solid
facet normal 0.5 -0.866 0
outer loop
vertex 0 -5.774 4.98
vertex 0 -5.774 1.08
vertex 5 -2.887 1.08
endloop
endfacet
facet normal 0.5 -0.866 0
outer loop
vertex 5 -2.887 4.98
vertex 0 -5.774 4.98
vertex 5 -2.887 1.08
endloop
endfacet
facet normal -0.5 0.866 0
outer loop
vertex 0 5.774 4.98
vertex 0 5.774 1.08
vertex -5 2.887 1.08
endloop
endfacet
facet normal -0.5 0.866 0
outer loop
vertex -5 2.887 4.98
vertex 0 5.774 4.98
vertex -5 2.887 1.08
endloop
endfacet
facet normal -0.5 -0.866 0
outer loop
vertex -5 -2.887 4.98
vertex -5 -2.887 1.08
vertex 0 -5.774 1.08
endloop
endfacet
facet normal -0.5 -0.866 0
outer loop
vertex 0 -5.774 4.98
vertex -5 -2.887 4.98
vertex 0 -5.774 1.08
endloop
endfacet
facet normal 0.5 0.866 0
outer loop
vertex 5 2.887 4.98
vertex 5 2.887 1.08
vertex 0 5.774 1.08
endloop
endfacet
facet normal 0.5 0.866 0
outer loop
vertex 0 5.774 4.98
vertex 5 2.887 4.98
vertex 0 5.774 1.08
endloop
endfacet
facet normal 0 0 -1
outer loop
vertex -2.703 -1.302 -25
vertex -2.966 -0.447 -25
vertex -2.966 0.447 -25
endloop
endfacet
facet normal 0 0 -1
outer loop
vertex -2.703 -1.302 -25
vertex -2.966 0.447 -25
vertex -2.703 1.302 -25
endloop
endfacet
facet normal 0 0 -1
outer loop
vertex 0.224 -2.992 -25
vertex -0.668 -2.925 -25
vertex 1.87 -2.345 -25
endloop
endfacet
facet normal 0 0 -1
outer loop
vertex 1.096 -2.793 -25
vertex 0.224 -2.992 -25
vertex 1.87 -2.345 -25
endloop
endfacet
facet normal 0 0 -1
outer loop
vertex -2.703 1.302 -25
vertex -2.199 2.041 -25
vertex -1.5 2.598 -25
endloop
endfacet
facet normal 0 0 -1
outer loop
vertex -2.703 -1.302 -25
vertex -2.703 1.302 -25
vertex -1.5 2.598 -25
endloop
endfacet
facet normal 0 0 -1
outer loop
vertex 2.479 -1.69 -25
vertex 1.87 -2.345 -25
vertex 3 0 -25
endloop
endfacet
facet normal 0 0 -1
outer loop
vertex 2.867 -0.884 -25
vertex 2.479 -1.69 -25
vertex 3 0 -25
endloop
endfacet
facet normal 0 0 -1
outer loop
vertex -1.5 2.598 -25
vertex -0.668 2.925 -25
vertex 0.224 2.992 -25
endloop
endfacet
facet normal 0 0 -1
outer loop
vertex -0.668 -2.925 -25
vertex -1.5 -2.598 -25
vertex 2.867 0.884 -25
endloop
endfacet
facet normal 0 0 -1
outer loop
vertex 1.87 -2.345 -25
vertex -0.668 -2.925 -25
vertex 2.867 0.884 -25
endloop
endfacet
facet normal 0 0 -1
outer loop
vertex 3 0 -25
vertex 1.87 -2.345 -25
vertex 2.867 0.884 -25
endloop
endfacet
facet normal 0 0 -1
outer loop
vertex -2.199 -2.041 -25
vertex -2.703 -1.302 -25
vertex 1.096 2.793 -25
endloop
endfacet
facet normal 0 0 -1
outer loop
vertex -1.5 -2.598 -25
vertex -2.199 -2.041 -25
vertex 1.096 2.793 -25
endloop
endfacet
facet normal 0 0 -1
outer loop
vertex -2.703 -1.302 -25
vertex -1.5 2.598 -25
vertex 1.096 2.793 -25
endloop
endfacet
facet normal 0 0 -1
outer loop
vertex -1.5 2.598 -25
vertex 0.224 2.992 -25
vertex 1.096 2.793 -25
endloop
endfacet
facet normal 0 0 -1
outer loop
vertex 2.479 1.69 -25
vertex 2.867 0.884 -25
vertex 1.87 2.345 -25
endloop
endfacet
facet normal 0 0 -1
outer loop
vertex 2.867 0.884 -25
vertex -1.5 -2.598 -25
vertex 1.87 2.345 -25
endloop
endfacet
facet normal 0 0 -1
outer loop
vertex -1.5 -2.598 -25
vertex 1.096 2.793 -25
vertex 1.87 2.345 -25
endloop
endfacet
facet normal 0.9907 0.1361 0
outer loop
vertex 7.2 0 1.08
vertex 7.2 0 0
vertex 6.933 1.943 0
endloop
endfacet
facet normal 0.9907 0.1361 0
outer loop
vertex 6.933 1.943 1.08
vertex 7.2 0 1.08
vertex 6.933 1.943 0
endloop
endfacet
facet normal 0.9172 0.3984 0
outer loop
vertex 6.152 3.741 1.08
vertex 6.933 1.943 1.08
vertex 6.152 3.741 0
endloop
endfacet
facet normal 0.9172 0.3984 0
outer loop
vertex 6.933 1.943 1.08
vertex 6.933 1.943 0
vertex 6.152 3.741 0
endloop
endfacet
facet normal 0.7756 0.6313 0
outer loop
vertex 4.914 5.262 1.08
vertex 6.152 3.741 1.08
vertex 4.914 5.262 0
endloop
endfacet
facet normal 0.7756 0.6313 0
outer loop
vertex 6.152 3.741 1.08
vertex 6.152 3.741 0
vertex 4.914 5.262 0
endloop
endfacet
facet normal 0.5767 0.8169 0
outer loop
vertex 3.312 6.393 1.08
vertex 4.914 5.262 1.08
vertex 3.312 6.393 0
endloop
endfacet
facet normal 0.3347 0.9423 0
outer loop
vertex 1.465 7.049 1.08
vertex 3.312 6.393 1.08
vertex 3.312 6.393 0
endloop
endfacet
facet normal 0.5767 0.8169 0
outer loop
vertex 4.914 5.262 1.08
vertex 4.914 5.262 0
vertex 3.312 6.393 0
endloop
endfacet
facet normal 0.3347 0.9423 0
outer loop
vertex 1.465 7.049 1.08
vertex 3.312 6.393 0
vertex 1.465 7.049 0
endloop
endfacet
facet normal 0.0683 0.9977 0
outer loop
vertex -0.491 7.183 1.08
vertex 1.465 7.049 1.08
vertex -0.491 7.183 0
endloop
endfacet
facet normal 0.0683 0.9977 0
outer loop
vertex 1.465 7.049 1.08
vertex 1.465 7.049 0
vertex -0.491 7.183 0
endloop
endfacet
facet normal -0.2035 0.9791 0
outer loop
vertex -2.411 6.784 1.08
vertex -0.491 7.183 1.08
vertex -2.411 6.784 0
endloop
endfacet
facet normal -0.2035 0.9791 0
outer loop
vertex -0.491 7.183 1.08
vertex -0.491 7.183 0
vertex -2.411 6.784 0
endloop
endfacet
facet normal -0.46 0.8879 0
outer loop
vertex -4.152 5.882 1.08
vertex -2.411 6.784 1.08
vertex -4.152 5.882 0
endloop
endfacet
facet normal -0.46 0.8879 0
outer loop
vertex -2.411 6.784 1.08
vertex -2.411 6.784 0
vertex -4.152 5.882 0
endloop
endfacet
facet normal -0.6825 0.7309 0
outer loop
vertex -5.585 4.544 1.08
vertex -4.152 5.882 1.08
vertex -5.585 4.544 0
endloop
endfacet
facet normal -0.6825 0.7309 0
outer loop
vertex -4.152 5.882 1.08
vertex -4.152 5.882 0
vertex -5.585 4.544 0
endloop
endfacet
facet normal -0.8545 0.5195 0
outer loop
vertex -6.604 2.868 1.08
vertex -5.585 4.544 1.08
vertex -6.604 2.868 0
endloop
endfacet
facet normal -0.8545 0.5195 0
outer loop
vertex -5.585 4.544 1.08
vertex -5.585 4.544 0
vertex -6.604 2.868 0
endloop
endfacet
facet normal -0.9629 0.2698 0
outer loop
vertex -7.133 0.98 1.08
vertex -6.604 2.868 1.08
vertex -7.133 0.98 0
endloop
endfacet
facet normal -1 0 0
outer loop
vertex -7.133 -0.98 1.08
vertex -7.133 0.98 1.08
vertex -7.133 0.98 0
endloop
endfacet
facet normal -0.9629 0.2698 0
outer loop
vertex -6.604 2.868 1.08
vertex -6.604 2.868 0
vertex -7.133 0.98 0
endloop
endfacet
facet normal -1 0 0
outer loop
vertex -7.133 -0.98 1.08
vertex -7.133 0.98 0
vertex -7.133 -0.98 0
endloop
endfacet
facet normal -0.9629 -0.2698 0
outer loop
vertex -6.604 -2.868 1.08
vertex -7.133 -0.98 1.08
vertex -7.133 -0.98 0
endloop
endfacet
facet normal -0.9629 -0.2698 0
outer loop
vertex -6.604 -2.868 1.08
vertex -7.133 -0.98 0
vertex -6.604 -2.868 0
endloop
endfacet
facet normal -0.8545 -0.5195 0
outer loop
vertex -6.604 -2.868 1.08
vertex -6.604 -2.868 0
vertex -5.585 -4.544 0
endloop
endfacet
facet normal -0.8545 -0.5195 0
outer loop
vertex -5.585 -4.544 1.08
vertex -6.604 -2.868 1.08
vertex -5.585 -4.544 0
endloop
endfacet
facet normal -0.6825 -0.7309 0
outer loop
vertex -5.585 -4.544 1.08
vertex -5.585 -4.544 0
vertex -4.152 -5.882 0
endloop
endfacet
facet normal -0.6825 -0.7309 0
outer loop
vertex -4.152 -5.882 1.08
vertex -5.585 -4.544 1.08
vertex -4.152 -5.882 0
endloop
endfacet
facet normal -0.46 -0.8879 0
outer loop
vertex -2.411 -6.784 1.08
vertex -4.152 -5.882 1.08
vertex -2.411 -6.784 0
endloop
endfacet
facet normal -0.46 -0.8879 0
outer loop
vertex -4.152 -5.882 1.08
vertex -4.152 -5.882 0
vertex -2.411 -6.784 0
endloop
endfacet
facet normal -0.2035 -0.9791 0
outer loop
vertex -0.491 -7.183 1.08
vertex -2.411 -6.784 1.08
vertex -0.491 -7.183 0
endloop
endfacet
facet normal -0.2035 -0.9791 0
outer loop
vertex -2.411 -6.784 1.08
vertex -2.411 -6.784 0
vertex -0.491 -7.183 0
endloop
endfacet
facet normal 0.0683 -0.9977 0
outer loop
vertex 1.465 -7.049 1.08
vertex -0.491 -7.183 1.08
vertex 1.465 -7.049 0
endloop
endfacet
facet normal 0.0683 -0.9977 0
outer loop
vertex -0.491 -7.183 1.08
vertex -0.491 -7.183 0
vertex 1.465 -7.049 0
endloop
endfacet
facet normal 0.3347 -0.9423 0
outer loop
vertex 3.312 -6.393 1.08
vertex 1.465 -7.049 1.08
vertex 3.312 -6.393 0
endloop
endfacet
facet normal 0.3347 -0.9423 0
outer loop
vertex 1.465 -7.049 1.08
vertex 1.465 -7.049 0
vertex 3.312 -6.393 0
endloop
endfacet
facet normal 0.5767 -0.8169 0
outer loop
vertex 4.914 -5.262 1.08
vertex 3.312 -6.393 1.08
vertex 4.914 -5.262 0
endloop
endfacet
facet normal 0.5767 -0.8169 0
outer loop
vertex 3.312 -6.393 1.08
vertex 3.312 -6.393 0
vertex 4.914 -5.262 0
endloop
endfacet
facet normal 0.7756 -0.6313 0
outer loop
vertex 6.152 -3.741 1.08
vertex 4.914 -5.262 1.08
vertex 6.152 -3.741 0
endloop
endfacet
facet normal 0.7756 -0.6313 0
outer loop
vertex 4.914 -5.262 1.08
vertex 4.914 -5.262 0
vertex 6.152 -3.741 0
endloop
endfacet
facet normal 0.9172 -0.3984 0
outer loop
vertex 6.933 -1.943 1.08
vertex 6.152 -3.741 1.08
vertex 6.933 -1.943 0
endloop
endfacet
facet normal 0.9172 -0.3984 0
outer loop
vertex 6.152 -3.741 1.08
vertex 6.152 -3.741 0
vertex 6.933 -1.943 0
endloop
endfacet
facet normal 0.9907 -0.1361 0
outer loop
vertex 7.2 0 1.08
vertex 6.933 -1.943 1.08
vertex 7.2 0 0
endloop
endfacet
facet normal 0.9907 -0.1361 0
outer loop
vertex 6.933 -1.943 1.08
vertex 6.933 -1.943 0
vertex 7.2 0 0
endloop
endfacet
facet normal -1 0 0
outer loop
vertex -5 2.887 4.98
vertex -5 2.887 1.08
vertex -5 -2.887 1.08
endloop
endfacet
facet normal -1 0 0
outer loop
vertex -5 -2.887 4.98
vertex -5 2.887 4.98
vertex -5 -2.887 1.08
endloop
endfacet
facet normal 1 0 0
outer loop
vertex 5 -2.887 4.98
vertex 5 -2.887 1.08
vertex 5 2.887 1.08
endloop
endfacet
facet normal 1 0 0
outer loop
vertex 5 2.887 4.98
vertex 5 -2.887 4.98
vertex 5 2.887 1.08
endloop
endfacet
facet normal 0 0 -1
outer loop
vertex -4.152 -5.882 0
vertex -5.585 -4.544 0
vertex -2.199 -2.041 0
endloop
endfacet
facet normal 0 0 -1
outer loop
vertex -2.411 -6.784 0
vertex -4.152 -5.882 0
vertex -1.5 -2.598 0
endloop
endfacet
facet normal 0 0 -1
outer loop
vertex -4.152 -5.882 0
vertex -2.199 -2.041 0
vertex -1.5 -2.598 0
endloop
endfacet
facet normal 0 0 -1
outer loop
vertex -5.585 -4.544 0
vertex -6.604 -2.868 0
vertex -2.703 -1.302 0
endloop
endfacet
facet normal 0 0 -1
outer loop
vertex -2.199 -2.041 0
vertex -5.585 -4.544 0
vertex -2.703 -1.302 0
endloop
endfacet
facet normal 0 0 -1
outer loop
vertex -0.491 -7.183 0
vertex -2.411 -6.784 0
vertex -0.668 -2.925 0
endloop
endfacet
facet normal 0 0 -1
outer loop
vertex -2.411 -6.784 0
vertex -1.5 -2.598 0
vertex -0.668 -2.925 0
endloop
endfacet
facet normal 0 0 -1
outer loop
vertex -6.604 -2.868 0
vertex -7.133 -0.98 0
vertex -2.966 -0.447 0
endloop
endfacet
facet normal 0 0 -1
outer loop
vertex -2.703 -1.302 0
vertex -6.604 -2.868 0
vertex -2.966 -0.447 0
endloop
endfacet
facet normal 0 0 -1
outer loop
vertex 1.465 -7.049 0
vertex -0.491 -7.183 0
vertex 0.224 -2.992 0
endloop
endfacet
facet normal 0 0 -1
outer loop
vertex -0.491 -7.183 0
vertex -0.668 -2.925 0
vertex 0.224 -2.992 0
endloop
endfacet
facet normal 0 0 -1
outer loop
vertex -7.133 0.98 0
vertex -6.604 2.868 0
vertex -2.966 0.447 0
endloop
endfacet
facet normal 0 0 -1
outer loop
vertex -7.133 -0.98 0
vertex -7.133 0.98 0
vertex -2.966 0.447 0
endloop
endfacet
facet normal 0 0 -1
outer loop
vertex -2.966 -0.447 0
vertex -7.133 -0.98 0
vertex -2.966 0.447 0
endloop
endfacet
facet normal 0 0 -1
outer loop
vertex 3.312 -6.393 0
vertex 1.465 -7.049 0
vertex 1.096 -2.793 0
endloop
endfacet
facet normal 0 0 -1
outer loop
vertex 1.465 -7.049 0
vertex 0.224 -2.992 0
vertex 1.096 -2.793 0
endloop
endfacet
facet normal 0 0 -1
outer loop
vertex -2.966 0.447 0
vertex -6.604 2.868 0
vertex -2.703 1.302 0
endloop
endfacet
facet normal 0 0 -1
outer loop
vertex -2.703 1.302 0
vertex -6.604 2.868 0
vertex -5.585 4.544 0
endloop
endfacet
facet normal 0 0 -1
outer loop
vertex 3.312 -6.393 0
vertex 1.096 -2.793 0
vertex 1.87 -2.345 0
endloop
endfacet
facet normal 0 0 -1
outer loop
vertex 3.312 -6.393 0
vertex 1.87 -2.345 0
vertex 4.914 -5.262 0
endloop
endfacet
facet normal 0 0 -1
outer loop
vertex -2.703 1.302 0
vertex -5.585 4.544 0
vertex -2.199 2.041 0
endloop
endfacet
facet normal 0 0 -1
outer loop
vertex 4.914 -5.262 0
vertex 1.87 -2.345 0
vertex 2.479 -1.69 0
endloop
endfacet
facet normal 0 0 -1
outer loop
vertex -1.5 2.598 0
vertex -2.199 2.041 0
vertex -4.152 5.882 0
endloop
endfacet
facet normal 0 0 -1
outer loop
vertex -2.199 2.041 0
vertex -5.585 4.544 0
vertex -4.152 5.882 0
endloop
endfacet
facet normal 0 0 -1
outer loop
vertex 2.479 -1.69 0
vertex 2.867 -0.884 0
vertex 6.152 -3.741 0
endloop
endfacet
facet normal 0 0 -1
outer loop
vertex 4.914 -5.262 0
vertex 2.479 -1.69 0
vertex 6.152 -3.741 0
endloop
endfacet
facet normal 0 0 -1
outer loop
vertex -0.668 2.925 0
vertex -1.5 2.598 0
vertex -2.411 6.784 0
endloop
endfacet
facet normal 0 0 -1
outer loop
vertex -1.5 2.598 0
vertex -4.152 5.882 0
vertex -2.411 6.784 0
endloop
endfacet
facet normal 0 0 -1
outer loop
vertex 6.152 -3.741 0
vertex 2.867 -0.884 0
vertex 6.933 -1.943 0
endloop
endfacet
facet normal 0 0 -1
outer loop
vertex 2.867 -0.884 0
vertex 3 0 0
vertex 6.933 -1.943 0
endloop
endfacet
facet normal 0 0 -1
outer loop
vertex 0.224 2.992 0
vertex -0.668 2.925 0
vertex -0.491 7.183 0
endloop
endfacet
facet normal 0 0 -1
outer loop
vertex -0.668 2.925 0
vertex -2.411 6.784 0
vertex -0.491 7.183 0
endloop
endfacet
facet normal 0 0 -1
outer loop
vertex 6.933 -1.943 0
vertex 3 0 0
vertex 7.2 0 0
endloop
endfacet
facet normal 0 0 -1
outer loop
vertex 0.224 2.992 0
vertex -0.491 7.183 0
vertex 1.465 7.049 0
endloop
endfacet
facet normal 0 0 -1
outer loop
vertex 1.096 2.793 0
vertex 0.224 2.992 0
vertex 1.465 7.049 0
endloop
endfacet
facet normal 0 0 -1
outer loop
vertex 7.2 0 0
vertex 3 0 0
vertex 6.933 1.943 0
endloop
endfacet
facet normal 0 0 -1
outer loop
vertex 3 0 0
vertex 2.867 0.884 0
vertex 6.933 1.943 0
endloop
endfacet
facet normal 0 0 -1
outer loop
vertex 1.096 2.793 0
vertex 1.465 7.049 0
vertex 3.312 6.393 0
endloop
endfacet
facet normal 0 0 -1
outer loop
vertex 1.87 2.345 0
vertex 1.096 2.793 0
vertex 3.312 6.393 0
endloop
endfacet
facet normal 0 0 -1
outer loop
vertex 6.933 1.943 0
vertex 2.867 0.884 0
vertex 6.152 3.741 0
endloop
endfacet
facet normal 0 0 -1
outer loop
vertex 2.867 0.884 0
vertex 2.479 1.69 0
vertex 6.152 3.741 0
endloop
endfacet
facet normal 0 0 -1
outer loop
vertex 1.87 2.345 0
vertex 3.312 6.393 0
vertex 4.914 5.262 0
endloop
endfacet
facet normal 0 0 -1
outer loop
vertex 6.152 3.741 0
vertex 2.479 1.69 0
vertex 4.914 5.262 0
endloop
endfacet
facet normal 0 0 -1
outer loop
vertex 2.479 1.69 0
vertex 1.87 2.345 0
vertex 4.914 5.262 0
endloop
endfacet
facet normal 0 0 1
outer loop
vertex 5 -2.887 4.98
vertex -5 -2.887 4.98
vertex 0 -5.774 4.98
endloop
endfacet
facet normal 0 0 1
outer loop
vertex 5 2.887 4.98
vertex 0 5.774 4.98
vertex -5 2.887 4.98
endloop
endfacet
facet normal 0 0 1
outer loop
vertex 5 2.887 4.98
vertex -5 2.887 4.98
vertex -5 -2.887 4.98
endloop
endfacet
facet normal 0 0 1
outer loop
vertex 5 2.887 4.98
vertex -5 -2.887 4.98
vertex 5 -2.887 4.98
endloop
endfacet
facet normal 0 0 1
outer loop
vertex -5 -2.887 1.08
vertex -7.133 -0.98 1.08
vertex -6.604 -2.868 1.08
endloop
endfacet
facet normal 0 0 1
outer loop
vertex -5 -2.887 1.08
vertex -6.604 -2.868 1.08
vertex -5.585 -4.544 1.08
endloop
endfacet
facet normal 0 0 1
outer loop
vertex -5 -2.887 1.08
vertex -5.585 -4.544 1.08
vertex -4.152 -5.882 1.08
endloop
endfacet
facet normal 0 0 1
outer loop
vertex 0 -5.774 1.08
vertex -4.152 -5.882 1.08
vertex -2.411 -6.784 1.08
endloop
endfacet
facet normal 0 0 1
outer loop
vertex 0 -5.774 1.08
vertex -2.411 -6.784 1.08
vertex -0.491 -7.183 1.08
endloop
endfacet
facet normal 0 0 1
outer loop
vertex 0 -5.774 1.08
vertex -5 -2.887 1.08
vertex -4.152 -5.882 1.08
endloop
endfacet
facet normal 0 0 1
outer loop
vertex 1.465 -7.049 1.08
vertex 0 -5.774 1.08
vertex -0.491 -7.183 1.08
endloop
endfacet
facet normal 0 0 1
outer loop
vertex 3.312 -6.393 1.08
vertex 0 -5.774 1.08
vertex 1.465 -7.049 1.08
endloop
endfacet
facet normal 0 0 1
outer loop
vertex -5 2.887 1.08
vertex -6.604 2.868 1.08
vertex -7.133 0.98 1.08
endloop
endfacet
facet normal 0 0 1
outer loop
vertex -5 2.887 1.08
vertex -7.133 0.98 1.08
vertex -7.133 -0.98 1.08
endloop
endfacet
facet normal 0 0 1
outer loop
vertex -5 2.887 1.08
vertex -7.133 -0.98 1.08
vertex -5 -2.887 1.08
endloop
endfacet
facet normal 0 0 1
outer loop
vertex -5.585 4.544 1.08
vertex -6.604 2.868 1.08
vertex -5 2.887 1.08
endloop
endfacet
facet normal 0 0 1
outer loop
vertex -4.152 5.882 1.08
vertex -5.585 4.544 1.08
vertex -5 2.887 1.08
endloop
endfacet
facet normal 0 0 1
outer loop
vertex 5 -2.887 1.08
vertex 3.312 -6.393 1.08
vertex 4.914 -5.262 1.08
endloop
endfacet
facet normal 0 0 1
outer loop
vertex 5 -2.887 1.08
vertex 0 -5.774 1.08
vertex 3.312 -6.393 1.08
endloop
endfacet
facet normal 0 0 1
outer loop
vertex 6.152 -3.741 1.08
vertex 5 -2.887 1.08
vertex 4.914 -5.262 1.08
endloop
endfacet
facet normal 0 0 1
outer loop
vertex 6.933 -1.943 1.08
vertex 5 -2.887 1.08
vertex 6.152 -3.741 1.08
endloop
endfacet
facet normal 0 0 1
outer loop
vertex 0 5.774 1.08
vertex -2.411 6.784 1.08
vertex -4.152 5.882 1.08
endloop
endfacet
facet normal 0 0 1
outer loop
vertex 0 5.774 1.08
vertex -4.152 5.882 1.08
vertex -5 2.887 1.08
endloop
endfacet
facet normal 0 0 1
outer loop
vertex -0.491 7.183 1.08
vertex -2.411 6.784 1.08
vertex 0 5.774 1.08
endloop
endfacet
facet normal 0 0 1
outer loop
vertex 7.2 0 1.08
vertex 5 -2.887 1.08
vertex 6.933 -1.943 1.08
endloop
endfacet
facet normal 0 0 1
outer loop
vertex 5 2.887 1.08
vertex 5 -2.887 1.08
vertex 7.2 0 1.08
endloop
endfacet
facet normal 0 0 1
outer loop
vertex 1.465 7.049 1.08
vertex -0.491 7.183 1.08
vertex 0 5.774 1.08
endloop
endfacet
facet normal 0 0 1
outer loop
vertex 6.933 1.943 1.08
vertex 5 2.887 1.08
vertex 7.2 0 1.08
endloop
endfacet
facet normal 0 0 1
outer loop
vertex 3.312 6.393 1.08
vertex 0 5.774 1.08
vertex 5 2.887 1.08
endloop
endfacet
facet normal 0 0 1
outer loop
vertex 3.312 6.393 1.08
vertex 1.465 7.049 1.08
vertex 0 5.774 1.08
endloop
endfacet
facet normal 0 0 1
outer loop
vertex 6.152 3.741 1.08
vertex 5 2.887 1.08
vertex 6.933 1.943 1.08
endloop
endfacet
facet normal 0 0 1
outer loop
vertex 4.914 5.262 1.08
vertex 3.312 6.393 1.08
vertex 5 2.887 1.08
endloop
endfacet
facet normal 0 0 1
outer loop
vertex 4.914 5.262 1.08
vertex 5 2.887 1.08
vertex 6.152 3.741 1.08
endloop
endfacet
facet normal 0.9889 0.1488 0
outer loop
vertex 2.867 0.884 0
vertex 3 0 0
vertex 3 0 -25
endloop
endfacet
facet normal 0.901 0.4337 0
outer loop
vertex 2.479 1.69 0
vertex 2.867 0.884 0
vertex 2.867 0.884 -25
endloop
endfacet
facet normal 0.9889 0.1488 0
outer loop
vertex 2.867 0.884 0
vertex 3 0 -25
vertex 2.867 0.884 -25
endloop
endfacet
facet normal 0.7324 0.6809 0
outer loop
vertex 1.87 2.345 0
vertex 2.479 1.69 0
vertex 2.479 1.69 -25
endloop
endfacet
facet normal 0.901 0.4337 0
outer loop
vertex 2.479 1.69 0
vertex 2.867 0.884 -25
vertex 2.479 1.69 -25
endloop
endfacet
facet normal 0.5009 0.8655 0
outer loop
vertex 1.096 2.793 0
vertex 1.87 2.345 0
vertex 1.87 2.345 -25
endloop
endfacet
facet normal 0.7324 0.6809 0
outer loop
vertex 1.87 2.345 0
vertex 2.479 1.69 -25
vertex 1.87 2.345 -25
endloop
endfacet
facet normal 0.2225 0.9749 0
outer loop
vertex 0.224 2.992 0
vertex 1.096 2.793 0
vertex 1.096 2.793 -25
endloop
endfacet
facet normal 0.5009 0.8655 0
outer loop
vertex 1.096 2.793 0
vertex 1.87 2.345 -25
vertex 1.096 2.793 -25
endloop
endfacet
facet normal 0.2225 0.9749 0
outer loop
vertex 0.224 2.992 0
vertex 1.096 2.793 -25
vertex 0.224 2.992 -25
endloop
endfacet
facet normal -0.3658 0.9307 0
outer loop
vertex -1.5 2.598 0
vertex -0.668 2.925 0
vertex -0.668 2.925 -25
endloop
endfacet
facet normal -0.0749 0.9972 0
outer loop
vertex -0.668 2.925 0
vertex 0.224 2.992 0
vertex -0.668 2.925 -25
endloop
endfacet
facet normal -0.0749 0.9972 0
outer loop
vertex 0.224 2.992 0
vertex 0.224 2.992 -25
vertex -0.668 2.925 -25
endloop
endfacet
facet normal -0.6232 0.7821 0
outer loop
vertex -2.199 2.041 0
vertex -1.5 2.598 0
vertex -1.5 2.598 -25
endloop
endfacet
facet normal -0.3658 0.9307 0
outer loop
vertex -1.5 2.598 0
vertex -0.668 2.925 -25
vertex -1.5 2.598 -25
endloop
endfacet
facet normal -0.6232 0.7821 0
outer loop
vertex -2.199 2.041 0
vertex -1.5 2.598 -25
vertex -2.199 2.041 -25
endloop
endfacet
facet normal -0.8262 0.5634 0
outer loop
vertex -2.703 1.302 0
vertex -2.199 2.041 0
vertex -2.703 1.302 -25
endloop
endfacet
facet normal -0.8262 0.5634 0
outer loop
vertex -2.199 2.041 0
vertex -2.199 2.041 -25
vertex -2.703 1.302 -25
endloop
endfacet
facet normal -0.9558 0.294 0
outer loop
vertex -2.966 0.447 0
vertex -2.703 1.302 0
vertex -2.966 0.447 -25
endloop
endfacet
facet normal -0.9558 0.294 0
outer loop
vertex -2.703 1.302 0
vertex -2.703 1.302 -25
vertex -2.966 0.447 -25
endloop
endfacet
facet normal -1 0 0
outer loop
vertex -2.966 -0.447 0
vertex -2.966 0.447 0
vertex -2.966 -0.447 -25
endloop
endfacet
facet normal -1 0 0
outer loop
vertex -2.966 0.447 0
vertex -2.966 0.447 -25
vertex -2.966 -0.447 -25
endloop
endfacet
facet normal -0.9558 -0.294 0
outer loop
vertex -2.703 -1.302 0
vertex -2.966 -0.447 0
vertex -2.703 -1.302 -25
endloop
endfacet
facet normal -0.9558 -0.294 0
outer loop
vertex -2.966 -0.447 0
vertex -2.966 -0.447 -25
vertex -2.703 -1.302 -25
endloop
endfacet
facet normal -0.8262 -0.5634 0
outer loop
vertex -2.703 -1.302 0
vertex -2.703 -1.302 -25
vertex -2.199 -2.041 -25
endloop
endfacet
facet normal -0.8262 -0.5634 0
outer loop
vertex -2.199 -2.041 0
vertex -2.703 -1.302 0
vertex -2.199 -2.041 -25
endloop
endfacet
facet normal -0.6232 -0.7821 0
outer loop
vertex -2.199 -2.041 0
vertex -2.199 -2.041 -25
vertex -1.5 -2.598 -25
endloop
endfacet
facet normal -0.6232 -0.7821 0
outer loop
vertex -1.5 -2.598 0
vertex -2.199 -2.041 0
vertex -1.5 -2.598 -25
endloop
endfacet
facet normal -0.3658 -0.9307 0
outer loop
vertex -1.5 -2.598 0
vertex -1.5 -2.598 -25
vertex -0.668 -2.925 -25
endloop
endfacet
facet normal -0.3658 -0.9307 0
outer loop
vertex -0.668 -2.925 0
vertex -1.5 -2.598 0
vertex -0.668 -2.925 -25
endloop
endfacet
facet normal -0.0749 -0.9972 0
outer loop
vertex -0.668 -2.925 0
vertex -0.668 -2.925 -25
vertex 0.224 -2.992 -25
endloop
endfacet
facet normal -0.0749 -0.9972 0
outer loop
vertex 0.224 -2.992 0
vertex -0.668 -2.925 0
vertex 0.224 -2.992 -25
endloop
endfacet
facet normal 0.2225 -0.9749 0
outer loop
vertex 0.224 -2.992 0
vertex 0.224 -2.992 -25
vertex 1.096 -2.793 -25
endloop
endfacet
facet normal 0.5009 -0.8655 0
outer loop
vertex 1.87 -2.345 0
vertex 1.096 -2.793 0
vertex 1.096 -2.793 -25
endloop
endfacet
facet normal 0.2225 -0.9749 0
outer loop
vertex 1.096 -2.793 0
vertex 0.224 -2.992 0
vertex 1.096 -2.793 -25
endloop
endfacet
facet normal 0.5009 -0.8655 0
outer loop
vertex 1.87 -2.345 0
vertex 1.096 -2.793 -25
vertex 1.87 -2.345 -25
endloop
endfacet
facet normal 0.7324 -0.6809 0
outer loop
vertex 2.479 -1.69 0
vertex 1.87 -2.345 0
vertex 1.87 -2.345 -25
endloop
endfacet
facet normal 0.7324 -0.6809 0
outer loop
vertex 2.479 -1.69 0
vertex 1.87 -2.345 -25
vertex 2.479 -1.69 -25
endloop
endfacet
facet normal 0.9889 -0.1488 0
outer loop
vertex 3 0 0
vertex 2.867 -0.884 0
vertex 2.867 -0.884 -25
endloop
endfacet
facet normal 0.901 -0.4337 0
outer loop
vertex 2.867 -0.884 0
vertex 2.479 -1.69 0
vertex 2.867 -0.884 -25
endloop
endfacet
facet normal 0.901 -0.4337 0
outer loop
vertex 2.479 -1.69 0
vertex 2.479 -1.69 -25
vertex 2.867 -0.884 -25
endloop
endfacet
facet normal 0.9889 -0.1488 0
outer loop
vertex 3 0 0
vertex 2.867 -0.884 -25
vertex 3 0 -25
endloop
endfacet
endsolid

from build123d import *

# Parameters (mm, degrees)
EXTRUDE_SKETCH_1_R = 7.2
EXTRUDE_1_DEPTH    = 1.08
EXTRUDE_START      = 1.08
EXTRUDE_2_DEPTH    = 3.9
EXTRUDE_START_2    = -25
EXTRUDE_SKETCH_3_R = 3
EXTRUDE_3_DEPTH    = 25.01


with BuildPart() as part:
    # Extrude sketch 1 → Extrude 1 (new body)
    with BuildSketch(Plane.XY):
        Circle(EXTRUDE_SKETCH_1_R)
    extrude(amount=EXTRUDE_1_DEPTH)


with BuildPart() as body_2:
    # Extrude sketch 2 → Extrude 2 (new body)
    with BuildSketch(Plane.XY.offset(EXTRUDE_START)):
        Polygon((5, 2.886751346), (0, 5.773502692), (-5, 2.886751346), (-5, -2.886751346), (0, -5.773502692), (5, -2.886751346), align=None)
    extrude(amount=EXTRUDE_2_DEPTH)


with BuildPart() as body_3:
    # Extrude sketch 3 → Extrude 3 (new body)
    with BuildSketch(Plane.XY.offset(EXTRUDE_START_2)):
        Circle(EXTRUDE_SKETCH_3_R)
    extrude(amount=EXTRUDE_3_DEPTH)


with BuildPart() as body_2_1:
    add(body_2.part)

    # Combine (weld / assembly of features): union part, body 3
    add(part.part)
    add(body_3.part)


solid = body_2_1.part
